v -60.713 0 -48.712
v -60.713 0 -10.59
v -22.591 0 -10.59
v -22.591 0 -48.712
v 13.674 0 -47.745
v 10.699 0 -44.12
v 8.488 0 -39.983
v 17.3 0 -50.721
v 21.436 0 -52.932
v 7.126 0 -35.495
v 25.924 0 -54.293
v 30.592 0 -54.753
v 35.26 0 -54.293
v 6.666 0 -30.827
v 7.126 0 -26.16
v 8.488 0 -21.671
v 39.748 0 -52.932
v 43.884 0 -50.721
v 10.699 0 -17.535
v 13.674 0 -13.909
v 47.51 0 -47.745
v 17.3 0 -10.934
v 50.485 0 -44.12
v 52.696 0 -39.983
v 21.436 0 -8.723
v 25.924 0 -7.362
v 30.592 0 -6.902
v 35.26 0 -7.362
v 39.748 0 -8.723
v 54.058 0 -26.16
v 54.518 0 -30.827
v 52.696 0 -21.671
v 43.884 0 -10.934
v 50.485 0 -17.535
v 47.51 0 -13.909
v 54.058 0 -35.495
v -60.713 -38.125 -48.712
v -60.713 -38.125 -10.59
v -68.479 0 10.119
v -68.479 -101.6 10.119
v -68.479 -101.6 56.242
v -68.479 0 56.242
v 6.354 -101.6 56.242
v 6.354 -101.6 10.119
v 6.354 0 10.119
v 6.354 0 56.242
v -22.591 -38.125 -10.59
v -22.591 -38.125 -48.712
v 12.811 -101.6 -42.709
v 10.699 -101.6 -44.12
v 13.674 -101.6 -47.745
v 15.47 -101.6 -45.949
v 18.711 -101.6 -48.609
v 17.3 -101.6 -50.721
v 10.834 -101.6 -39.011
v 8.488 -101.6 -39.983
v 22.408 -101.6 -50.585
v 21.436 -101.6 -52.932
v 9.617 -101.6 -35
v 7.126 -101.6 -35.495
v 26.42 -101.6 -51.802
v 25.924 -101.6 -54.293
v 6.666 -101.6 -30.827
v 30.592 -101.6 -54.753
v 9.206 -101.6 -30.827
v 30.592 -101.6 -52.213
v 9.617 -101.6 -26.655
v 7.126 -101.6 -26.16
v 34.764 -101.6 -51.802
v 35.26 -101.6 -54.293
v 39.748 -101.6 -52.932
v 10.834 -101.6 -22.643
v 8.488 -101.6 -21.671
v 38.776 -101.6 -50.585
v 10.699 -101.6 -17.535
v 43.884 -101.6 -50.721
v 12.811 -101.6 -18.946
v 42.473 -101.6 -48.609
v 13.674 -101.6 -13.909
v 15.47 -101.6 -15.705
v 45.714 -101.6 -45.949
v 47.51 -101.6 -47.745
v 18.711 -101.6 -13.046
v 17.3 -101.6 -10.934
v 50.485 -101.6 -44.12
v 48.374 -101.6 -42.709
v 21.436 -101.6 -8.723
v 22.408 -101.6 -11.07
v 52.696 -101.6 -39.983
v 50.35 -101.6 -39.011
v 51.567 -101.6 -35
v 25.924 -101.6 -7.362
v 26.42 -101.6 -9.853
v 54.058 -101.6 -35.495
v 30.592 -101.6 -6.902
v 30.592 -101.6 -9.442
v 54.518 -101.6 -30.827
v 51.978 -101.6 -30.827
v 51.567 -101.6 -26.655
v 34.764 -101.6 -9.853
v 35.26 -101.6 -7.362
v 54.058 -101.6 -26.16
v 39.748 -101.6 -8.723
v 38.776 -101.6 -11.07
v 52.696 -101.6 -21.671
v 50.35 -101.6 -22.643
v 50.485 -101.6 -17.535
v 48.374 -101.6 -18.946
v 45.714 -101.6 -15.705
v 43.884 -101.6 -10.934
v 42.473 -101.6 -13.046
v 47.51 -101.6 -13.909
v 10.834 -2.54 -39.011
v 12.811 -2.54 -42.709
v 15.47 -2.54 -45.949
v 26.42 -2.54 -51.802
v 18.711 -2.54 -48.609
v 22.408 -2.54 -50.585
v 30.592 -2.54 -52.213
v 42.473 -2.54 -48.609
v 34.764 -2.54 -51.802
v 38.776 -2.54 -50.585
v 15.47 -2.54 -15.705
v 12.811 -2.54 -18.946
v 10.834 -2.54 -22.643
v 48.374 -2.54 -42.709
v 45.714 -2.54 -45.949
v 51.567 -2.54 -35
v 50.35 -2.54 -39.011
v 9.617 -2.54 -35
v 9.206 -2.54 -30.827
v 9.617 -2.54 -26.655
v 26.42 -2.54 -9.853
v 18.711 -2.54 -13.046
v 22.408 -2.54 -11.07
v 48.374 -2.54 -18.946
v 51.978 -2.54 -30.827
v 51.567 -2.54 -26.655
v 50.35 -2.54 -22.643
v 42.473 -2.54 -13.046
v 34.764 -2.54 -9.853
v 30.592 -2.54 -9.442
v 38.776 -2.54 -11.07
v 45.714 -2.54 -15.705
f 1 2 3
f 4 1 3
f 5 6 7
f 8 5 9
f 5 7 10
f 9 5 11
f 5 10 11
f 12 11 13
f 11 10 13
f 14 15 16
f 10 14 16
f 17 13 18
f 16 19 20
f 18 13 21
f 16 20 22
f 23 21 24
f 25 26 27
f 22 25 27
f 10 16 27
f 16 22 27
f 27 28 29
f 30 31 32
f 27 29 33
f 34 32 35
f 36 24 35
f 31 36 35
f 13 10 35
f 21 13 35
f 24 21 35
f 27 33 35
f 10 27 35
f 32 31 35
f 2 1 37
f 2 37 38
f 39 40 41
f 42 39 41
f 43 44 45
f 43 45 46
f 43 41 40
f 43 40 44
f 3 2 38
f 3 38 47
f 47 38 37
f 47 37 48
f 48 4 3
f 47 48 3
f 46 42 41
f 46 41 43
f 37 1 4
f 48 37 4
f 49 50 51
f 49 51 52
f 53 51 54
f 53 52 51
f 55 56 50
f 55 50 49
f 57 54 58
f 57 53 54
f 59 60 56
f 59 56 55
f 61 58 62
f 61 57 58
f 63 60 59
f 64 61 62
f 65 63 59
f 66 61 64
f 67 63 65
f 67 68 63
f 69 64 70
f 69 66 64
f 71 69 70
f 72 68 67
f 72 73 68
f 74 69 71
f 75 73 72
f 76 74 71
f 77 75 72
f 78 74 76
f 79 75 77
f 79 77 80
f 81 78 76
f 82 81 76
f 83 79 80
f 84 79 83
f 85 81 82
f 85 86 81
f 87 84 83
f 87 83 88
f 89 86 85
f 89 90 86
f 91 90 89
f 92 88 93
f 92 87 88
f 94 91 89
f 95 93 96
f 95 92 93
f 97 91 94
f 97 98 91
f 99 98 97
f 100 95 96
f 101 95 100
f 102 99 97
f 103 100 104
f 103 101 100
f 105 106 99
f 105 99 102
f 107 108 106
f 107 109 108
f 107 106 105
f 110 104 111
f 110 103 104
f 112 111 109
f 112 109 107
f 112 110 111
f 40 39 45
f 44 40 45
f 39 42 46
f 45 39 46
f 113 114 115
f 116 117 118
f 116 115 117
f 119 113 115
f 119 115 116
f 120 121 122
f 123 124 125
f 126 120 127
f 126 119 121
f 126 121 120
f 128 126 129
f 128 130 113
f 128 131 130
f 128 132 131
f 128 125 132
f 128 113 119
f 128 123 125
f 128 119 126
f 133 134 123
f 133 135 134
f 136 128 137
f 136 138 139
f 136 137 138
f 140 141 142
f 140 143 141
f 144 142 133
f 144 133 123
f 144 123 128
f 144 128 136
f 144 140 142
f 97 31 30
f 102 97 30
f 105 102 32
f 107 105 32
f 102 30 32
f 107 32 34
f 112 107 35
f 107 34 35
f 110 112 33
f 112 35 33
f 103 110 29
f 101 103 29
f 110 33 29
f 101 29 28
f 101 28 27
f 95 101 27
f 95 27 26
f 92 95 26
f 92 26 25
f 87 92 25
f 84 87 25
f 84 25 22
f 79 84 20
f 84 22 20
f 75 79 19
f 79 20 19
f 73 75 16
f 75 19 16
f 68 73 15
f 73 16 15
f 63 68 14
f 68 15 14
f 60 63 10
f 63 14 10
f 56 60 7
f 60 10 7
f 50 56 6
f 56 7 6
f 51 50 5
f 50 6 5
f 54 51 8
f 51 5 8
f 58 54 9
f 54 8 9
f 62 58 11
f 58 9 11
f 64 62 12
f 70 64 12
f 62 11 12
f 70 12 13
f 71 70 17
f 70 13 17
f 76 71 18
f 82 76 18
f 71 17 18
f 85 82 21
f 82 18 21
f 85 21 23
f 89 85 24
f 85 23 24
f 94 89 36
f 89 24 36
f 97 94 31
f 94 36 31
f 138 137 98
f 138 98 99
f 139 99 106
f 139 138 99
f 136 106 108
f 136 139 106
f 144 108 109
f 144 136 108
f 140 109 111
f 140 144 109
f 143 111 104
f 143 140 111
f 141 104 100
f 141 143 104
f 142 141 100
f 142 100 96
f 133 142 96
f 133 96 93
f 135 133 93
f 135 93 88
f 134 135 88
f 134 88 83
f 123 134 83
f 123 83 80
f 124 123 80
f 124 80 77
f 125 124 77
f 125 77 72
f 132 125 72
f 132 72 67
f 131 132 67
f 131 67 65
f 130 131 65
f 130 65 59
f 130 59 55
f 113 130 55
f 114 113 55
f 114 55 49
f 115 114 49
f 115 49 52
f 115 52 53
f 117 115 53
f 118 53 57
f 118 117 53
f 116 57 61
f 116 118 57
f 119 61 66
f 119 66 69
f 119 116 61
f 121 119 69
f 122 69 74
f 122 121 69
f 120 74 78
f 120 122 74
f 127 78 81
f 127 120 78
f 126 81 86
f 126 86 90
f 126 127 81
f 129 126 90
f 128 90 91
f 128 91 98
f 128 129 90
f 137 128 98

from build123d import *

# Parameters (mm, degrees)
F0_W     = 74.832886
F0_H     = 46.123411
F2_DEPTH = 101.6
F1_W     = 38.122408
F1_H     = 38.122413
F3_DEPTH = 38.1254
F4_R     = 23.925589
F5_DEPTH = 101.6
F6_T     = -2.54


with BuildPart() as f2:
    # F0 (on Front) → F2 (new body)
    with BuildSketch(Plane.XZ):
        with Locations((-31.062708, 33.180618)):
            Rectangle(F0_W, F0_H)
    extrude(amount=F2_DEPTH)


with BuildPart() as f3:
    # F1 (on Front) → F3 (new body)
    with BuildSketch(Plane.XZ):
        with Locations((-41.652266, -29.650766)):
            Rectangle(F1_W, F1_H)
    extrude(amount=F3_DEPTH)


with BuildPart() as f5:
    # F4 (on Front) → F5 (new body)
    with BuildSketch(Plane.XZ):
        with Locations((30.59206, -30.827383)):
            Circle(F4_R)
    extrude(amount=F5_DEPTH)

    # F6
    f6_openings = [f5.faces().sort_by_distance(p)[0] for p in [
        (30.59206, -101.6, -30.827383),
    ]]
    offset(amount=F6_T, openings=f6_openings)


solid = Compound([f2.part, f3.part, f5.part])
